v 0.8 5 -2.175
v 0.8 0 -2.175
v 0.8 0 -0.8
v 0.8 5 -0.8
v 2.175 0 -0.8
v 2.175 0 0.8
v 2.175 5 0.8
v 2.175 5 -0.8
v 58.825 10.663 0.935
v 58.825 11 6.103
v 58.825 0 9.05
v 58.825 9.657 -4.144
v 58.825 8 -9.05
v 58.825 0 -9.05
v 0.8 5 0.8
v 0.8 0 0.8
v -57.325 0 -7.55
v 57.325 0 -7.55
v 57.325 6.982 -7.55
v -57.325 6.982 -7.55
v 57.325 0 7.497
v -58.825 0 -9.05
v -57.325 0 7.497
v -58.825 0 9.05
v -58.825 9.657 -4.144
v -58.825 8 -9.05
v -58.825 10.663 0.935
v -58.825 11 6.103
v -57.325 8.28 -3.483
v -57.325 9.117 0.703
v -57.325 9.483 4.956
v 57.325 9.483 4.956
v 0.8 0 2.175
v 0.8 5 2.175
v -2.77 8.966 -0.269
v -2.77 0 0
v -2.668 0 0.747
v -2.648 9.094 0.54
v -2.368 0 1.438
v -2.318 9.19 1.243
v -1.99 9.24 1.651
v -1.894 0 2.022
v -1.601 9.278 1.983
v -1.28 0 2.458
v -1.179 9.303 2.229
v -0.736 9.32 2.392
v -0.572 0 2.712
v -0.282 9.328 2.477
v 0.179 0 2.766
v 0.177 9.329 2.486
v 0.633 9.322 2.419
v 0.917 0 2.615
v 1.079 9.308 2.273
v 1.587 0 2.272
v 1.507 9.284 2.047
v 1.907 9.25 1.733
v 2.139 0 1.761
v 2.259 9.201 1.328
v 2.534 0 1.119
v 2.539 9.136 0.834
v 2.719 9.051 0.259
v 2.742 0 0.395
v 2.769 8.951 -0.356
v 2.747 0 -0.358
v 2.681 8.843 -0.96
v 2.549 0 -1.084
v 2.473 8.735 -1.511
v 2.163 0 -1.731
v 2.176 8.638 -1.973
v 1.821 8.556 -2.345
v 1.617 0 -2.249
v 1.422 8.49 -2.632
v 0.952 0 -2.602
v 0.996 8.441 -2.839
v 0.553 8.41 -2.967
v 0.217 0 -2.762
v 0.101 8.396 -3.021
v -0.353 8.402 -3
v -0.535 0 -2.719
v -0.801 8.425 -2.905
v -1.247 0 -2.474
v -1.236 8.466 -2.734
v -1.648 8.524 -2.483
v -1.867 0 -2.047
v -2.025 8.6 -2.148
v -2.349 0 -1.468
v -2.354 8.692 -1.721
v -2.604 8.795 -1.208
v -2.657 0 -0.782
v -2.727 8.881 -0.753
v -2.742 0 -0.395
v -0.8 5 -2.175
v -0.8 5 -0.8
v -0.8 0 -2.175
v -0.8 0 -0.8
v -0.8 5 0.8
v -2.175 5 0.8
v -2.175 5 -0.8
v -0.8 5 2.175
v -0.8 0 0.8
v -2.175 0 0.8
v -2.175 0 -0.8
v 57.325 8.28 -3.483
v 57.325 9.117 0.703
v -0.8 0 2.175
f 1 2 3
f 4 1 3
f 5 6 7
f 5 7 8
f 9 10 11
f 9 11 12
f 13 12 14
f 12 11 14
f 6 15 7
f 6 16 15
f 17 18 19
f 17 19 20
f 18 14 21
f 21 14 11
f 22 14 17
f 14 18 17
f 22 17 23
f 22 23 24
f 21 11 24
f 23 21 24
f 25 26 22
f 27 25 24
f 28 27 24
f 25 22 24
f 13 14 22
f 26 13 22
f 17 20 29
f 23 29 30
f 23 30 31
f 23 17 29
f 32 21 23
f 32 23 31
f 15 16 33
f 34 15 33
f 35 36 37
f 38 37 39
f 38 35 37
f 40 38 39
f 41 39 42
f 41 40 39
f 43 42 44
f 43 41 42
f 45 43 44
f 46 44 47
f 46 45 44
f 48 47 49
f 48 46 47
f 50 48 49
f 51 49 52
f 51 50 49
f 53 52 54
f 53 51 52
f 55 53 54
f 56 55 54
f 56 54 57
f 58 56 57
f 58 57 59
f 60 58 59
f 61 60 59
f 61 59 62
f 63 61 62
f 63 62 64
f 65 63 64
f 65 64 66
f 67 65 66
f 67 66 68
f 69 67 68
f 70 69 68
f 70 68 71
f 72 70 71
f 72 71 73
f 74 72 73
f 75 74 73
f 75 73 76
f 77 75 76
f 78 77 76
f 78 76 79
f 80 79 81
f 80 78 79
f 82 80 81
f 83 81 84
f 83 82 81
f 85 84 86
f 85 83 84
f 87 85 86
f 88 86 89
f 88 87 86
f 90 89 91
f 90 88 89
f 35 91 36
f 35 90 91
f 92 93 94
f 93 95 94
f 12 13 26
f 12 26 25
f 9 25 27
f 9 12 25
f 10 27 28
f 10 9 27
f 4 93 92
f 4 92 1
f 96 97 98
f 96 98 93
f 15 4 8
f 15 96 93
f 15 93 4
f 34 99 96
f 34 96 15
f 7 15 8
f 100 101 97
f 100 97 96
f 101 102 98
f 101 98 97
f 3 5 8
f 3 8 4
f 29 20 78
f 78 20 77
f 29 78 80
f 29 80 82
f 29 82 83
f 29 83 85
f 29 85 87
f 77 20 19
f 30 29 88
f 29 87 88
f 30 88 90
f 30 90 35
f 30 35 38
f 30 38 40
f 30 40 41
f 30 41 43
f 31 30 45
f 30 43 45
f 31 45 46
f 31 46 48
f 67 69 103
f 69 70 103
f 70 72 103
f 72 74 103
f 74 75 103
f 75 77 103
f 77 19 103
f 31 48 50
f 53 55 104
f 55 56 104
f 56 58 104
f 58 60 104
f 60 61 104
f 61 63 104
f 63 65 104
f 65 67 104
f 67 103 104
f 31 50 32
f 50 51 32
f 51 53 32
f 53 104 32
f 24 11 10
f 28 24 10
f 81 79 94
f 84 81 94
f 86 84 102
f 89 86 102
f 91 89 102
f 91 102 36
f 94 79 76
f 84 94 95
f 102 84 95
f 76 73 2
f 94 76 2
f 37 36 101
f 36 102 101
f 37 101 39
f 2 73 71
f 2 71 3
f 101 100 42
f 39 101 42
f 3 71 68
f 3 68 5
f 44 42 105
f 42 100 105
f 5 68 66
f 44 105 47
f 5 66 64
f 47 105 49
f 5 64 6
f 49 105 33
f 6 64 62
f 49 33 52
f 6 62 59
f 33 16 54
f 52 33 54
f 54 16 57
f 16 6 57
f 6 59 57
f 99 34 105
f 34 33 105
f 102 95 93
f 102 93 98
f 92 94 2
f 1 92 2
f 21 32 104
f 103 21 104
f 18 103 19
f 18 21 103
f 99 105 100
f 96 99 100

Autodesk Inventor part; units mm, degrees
ref_plane "YZ Plane" through (0, 0, 0) normal (1, 0, 0) x (0, 1, 0)
ref_plane "XZ Plane" through (0, 0, 0) normal (0, 1, 0) x (-1, 0, 0)
sketch "Spacebar base" plane through (0, 0, 0) normal (0, 1, 0) x (-1, 0, 0)
  line L0 (58.825, 9.05) -> (-58.825, 9.05)
  line L1 (-58.825, 9.05) -> (-58.825, -9.05)
  line L2 (-58.825, -9.05) -> (58.825, -9.05)
  line L3 (58.825, -9.05) -> (58.825, 9.05)
  line L4 (58.825, 9.05) -> (-58.825, -9.05) construction
  line L5 (-58.825, 9.05) -> (58.825, -9.05) construction
  point P0 (0, 0)
  dimension "d0" = 117.65
  dimension "d1" = 18.1
extrude "Spacebar Bulk" add sketch "Spacebar base" along normal blind 11
sketch "Curve Profile" plane through (58.825, 0, 9.05) normal (1, 0, 0) x (0, 0, -1)
  line L0 (0, 0) -> (18.1, 0) projected
  line L1 (0, 0) -> (2.9474, 11)
  line L2 (0, 11) -> (18.1, 11) projected
  line L3 (18.1, 0) -> (18.1, 11) projected
  arc A0 (18.1, 8) -> (2.9474, 11) centre (2.9474, -28.7667) ccw
  line L4 (0, 0) -> (0, 11) projected
  line L5 (18.1, 8) -> (18.1, 0)
  line L6 (18.1, 0) -> (0, 0)
  point P0 (9.05, 0)
  dimension "d4" = 15
  dimension "d9" = 8
extrude "Curve Cutaway" cut sketch "Curve Profile" against normal up to surface (117.65 mm away) contours L1 A0 L3 L0 keep common part
shell "Inner Shell" thickness 1.5 removed faces 1 at (19.6083, 0, 3.0167)
ref_plane "PoleBase Plane" through (57.325, 9.4828, 4.9562) normal (0, 0.9996, -0.03) x (-1, 0, 0)
sketch "Center Circle" plane through (57.325, 9.4828, 4.9562) normal (0, 0.9996, -0.03) x (-1, 0, 0)
  circle A0 centre (57.325, -5.238) radius 2.77
  dimension "d11" = 5.54
extrude "Pole Extrusion" add sketch "Center Circle" against normal up to surface surface through (0, 0, 0) normal (0, 1, 0)
sketch "Sketch4" plane through (0, 0, 0) normal (0, -1, 0) x (1, 0, 0)
  line L0 (-2.175, 0.8) -> (2.175, 0.8)
  line L1 (2.175, 0.8) -> (2.175, -0.8)
  line L2 (2.175, -0.8) -> (-2.175, -0.8)
  line L3 (-2.175, -0.8) -> (-2.175, 0.8)
  line L4 (-2.175, 0.8) -> (2.175, -0.8) construction
  line L5 (2.175, 0.8) -> (-2.175, -0.8) construction
  line L6 (0.8, 2.175) -> (-0.8, 2.175)
  line L7 (-0.8, 2.175) -> (-0.8, -2.175)
  line L8 (-0.8, -2.175) -> (0.8, -2.175)
  line L9 (0.8, -2.175) -> (0.8, 2.175)
  line L10 (0.8, 2.175) -> (-0.8, -2.175) construction
  line L11 (-0.8, 2.175) -> (0.8, -2.175) construction
  point P0 (0, 0)
  dimension "d14" = 4.35
  dimension "d15" = 1.6
  dimension "d16" = 1.6
  dimension "d17" = 4.35
extrude "Extrusion4" cut sketch "Sketch4" against normal blind 5
equation "\"d0\" = b_space"
equation "\"d1\" = k_width"
equation "\"d10\" = k_wthick"
equation "\"d11\" = k_poledia"
equation "\"d14\" = k_cmxl"
equation "\"d15\" = k_cmxw"
equation "\"d16\" = k_cmxw"
equation "\"d17\" = k_cmxl"
equation "\"k_width\" = 18.1"
equation "\"k_height\" = 18"
equation "\"k_height_t\" = 16"
equation "\"k_taper1\" = 1.5"
equation "\"k_taper2\" = 0.5"
equation "\"k_staper\" = 1"
equation "\"k_sradius\" = 4"
equation "\"k_ltaper\" = 1.5"
equation "\"k_lradius\" = 6"
equation "\"k_radius\" = 6"
equation "\"k_wthick\" = 1.5"
equation "\"k_ribthick\" = 1.5"
equation "\"k_ribheight\" = 5"
equation "\"k_poleoff\" = 2.2625"
equation "\"k_poledia\" = 5.54"
equation "\"k_cmxw\" = 1.6"
equation "\"k_cmxl\" = 4.35"
equation "\"s_bwidth\" = 15.6"
equation "\"s_poleh\" = 3.6"
equation "\"s_polebw\" = 5.5"
equation "\"s_polebl\" = 7"
equation "\"b_pad\" = 1"
equation "\"b_tab\" = 27.15"
equation "\"b_caps\" = 31.675"
equation "\"b_lshift\" = 40.725"
equation "\"b_rshift\" = 49.775"
equation "\"b_ctrl\" = 22.625"
equation "\"b_space\" = 117.65"
equation "\"b_width\" = 286.5"
equation "\"b_height\" = 77.4"
equation "\"k_taper_wide\" = 1.5"
equation "\"k_height_low\" = 16"
equation "\"k_taper_thin\" = 0.5"
properties part number "spacebar-keycap_mockup_cherrymx"
